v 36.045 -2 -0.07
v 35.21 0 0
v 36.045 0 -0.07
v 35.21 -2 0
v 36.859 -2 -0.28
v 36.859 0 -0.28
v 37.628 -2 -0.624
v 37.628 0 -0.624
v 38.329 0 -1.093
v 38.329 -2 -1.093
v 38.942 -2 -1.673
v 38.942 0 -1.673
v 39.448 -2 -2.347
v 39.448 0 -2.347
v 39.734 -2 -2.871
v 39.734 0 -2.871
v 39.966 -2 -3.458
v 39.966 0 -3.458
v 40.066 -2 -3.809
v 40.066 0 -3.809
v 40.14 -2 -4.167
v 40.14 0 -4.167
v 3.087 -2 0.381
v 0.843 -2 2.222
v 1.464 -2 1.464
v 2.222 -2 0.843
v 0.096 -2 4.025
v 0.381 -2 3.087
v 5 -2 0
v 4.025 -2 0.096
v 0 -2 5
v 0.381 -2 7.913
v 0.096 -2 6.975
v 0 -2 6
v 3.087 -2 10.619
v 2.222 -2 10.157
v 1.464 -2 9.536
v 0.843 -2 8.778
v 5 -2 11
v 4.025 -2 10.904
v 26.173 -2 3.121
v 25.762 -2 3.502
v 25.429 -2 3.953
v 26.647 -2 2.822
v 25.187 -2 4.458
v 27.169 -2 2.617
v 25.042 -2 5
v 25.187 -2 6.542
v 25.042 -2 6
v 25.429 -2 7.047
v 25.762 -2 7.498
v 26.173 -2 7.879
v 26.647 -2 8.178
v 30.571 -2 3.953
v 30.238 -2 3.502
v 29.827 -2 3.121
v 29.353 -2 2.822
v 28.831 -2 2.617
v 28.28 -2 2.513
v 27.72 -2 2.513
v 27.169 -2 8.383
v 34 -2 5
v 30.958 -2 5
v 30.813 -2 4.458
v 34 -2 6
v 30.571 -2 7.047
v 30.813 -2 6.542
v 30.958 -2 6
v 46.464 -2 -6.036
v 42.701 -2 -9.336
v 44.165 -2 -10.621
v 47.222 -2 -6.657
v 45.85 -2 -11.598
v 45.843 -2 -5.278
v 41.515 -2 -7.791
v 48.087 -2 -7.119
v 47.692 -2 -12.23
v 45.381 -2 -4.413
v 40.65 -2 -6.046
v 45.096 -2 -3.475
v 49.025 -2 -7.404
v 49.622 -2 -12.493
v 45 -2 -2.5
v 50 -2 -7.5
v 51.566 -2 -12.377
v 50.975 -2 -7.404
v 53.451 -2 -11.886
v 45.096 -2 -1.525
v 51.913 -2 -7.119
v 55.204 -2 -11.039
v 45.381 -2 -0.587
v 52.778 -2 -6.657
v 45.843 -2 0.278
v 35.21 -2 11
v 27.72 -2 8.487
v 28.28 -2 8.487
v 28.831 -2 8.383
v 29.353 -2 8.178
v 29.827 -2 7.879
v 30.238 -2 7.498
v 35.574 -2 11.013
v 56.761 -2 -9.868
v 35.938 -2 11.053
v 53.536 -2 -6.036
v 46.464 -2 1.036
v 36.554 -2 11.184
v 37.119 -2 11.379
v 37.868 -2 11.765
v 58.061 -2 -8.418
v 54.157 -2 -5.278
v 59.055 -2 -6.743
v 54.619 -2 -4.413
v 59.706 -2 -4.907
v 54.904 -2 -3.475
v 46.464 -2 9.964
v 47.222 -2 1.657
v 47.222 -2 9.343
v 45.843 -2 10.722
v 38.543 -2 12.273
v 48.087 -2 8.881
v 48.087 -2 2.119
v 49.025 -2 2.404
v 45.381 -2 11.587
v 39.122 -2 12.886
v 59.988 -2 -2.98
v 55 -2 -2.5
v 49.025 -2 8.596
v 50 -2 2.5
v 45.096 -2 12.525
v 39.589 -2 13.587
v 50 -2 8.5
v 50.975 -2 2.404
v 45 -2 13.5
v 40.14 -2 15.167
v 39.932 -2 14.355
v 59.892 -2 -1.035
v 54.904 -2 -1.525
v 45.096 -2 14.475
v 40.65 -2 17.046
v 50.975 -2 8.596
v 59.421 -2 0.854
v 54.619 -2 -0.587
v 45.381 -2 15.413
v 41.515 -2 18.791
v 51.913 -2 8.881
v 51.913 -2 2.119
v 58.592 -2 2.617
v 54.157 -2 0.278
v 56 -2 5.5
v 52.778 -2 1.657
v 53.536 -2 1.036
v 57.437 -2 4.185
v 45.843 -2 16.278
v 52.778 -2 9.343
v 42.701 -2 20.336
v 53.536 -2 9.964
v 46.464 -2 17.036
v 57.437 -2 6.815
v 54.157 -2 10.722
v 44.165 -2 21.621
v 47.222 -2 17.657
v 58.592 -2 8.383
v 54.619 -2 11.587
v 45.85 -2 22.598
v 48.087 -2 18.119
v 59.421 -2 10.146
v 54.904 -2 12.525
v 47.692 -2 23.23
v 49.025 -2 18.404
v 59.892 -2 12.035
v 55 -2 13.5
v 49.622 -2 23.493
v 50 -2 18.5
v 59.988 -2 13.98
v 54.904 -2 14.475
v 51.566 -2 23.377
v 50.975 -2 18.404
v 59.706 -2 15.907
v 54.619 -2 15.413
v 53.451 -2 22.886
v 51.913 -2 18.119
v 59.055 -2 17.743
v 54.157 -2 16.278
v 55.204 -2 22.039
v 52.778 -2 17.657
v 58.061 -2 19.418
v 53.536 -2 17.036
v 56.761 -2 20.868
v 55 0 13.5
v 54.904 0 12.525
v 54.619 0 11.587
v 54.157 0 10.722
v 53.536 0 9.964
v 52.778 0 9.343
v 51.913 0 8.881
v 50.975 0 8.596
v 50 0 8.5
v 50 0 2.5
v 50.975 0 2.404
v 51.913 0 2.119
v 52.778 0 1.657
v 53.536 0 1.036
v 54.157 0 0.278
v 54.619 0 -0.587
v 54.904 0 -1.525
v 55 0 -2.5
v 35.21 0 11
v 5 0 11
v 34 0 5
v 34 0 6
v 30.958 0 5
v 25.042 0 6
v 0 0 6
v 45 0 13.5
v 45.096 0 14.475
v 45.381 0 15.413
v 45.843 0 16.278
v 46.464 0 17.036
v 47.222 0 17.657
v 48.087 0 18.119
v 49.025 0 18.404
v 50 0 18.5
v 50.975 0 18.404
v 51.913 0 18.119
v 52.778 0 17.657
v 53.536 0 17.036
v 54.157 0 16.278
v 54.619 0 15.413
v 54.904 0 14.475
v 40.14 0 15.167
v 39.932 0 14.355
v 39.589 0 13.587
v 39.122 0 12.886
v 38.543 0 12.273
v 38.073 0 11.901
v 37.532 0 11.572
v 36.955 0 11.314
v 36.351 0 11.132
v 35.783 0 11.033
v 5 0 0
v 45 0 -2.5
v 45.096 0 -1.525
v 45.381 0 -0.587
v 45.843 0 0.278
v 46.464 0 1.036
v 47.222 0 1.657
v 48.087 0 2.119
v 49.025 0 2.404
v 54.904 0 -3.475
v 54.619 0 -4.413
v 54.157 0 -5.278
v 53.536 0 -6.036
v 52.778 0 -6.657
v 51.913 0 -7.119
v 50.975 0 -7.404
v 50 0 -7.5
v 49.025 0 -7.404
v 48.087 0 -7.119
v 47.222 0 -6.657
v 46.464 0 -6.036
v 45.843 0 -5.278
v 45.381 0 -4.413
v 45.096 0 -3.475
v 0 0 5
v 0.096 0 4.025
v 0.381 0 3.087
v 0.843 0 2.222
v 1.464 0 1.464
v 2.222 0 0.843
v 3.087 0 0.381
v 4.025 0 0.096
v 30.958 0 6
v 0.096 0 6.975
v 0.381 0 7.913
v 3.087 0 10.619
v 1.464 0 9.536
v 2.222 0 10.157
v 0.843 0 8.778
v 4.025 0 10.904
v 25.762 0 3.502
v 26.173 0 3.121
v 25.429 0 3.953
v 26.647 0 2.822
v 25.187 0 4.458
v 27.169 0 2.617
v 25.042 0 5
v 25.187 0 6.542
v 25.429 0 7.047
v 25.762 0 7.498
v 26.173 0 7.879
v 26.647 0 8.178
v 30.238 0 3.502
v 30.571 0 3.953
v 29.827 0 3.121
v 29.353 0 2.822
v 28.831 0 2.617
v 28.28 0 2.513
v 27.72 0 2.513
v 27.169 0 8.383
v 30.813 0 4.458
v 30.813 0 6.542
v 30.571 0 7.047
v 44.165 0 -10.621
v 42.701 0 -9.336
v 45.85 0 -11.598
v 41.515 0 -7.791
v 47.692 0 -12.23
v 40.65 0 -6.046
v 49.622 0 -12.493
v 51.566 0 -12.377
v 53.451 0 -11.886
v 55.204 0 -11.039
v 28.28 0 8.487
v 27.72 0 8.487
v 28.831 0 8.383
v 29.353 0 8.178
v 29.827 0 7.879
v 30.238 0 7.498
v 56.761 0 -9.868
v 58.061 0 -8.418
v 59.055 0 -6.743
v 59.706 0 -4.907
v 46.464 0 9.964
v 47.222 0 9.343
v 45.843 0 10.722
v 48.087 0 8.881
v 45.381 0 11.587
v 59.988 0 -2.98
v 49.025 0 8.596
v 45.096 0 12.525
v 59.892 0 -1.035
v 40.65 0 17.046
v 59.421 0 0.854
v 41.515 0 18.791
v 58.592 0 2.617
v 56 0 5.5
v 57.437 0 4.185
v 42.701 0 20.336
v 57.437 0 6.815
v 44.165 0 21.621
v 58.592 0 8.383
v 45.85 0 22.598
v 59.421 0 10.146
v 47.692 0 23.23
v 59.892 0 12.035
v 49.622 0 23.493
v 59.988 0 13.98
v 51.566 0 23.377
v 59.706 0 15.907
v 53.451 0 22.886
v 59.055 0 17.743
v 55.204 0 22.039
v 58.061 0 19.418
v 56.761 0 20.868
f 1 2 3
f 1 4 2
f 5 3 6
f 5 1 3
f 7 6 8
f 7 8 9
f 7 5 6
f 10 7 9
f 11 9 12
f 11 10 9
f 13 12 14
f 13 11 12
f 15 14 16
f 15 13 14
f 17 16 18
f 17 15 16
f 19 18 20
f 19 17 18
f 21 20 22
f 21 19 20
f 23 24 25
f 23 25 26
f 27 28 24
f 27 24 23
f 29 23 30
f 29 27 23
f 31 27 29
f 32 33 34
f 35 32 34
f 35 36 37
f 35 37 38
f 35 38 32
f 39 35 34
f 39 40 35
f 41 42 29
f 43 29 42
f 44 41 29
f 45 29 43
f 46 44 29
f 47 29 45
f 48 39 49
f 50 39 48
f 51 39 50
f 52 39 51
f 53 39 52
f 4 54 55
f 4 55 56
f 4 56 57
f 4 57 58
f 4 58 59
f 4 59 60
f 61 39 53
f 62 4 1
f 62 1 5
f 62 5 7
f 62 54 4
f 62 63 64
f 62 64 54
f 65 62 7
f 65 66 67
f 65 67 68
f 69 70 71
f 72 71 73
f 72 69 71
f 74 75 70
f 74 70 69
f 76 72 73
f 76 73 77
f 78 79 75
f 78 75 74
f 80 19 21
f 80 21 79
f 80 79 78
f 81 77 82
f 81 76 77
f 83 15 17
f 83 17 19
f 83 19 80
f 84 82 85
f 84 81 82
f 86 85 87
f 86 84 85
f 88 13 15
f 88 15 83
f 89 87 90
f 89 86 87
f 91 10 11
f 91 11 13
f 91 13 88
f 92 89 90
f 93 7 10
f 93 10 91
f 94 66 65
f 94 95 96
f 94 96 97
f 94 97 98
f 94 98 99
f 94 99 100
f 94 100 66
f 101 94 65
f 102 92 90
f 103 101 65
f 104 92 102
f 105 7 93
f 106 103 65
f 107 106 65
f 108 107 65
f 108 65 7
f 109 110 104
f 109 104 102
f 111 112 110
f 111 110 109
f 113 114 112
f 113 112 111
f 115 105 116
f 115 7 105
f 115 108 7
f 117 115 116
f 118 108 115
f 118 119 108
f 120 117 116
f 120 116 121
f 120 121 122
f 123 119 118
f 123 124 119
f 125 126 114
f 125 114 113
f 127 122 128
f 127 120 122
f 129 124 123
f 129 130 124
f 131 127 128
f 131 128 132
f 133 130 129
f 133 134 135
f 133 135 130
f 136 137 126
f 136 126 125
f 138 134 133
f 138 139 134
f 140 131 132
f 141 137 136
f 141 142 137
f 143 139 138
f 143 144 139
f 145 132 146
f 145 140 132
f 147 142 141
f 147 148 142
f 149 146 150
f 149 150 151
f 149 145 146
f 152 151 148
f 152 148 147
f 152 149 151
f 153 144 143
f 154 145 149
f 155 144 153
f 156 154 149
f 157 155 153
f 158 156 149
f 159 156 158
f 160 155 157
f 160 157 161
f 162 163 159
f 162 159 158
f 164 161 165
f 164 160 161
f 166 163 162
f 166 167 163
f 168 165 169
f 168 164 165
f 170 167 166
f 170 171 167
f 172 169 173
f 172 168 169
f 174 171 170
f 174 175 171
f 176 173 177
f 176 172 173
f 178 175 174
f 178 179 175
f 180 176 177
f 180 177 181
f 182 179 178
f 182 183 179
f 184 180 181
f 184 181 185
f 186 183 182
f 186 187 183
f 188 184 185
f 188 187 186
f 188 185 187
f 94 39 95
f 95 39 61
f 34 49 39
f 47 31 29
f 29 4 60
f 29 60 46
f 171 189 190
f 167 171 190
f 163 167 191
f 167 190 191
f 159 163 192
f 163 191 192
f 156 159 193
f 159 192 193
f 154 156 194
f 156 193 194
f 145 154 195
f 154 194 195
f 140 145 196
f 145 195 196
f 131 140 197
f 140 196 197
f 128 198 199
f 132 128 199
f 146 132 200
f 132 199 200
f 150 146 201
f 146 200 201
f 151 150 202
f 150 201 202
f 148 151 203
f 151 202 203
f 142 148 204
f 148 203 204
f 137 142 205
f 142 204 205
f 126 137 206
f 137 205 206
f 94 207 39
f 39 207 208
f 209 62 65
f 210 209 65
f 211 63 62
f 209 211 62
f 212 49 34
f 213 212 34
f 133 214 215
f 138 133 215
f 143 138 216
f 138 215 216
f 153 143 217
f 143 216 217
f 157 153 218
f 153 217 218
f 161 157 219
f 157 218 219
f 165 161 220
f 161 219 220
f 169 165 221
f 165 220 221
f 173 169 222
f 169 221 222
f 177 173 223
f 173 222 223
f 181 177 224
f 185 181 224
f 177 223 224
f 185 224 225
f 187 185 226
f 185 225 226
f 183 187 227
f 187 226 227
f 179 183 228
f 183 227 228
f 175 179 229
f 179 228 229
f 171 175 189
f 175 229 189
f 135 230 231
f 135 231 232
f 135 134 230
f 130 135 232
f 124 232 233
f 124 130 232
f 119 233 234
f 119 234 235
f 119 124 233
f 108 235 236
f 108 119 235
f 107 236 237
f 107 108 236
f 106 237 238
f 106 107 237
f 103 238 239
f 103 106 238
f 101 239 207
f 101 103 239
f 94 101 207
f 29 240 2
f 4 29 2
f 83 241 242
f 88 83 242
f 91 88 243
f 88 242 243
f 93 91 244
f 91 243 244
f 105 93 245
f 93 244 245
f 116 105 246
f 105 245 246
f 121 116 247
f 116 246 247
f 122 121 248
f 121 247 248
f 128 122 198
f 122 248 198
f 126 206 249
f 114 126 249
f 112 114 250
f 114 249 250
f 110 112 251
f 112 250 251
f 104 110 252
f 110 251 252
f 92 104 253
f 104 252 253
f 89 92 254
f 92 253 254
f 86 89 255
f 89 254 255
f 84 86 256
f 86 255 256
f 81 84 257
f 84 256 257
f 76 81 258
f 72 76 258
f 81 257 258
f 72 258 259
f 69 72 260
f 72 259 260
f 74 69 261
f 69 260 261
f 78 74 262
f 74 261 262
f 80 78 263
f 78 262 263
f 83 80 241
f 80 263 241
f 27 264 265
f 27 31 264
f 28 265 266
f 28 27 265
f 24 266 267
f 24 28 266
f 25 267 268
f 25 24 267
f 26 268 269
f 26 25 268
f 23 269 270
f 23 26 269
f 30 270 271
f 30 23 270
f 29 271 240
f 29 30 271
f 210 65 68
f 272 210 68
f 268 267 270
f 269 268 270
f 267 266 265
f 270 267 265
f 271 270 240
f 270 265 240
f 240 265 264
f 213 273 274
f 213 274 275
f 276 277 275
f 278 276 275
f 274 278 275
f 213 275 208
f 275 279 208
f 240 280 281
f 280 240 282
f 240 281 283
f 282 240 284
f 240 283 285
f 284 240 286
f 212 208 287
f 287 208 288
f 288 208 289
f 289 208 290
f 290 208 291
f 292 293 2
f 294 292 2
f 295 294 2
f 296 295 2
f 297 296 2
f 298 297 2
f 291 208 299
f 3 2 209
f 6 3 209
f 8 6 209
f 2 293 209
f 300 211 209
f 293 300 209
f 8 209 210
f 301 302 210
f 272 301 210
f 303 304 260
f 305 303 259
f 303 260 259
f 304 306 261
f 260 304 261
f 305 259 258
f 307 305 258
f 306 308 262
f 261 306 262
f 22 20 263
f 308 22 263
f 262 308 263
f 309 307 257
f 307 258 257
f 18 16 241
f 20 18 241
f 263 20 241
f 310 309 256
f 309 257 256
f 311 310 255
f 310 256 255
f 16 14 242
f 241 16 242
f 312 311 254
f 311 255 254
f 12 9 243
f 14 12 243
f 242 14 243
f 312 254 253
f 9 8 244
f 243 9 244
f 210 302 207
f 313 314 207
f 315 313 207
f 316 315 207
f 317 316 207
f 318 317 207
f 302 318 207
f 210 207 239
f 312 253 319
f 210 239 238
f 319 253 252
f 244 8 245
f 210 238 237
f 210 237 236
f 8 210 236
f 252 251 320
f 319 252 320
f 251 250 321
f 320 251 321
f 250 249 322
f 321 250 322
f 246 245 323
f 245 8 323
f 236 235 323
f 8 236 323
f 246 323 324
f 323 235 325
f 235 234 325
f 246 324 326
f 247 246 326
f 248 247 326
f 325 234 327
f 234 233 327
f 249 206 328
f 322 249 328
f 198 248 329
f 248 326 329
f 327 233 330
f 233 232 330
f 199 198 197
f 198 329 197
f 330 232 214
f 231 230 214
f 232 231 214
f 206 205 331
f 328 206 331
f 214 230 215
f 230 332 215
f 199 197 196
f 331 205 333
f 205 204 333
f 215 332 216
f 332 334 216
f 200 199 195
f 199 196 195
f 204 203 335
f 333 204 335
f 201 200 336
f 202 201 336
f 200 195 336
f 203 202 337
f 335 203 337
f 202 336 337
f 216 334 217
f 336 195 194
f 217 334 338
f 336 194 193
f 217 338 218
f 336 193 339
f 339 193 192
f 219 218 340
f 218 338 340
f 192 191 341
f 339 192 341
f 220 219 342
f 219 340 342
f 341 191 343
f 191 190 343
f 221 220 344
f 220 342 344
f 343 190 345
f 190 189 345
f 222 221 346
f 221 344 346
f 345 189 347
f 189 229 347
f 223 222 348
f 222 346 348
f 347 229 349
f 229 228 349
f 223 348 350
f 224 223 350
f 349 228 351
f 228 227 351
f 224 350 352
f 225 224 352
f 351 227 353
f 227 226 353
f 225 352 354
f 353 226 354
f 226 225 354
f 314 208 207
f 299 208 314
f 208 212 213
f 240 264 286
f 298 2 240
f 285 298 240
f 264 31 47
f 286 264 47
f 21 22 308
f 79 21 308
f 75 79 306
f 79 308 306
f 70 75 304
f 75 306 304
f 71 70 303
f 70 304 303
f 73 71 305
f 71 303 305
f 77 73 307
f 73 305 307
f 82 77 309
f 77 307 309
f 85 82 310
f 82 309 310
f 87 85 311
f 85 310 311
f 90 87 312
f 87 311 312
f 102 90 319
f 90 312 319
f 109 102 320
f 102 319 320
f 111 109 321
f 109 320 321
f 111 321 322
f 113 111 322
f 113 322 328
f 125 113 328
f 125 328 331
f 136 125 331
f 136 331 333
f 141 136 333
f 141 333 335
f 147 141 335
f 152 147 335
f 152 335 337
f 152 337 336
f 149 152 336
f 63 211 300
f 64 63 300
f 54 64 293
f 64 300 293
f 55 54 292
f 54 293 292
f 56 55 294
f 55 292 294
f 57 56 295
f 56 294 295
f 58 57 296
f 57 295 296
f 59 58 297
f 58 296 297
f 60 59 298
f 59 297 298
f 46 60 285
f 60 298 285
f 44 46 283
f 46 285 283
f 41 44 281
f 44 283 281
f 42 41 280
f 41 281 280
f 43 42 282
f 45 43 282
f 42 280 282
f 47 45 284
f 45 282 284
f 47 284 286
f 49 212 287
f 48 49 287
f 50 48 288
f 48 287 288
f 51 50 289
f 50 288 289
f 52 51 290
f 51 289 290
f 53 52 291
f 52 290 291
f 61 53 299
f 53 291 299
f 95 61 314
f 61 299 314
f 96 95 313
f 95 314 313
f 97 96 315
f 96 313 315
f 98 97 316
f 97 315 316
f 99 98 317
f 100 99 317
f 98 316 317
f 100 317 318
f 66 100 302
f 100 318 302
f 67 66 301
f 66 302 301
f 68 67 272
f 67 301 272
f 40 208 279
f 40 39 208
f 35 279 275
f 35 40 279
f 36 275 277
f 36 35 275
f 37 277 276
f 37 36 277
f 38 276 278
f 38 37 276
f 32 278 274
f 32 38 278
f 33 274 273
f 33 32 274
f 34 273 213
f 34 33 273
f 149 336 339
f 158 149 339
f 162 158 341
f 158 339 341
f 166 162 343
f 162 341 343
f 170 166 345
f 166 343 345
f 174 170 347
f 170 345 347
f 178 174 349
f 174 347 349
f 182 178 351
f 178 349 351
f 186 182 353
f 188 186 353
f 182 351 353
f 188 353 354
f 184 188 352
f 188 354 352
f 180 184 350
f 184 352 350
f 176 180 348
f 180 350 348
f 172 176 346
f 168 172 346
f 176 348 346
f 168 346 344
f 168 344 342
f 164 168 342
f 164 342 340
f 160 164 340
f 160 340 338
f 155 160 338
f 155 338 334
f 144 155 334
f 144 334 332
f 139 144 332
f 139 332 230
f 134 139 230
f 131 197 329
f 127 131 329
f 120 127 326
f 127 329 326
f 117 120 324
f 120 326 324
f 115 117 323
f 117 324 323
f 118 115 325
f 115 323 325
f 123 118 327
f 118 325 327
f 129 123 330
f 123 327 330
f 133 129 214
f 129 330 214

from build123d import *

# Parameters (mm, degrees)
F1_DEPTH = 2
F2_R     = 5
F4_DEPTH = 2


# Not quite as in the source:
# - a feature names something its author has since deleted; it is built from what else it names


with BuildPart() as f1:
    # F0 (on Front) → F1 (new body)
    with BuildSketch(Plane.XZ):
        with BuildLine():
            Line((0, 5.5), (0, 0))
            Line((0, 0), (40, 0))
            Line((40, 0), (40, 5.5))
            Line((40, 5.5), (31, 5.5))
            ThreePointArc((31, 5.5), (28, 2.5), (25, 5.5))
            Line((25, 5.5), (0, 5.5))
        make_face()
        with BuildLine():
            Line((40, 5.5), (40, 0))
            Line((40, 0), (40, -2.5))
            ThreePointArc((40, -2.5), (41.05572809, 1.972135955), (44, 5.5))
            Line((44, 5.5), (40, 5.5))
        make_face()
        with BuildLine():
            Line((0, 11), (0, 5.5))
            Line((0, 5.5), (25, 5.5))
            ThreePointArc((25, 5.5), (28, 8.5), (31, 5.5))
            Line((31, 5.5), (40, 5.5))
            Line((40, 5.5), (40, 11))
            Line((40, 11), (0, 11))
        make_face()
        with BuildLine():
            Line((40, 11), (40, 5.5))
            Line((40, 5.5), (44, 5.5))
            ThreePointArc((44, 5.5), (41.05572809, 9.027864045), (40, 13.5))
            Line((40, 13.5), (40, 11))
        make_face()
        with BuildLine():
            Line((45, -2.5), (40, -2.5))
            ThreePointArc((40, -2.5), (50, -12.5), (60, -2.5))
            ThreePointArc((60, -2.5), (58.94427191, 1.972135955), (56, 5.5))
            ThreePointArc((56, 5.5), (53.1622776602, 4.0131670195), (50, 3.5))
            Line((50, 3.5), (50, 2.5))
            ThreePointArc((50, 2.5), (53.5355339059, 1.0355339059), (55, -2.5))
            ThreePointArc((55, -2.5), (50, -7.5), (45, -2.5))
        make_face()
        with BuildLine():
            ThreePointArc((44, 5.5), (41.05572809, 1.972135955), (40, -2.5))
            Line((40, -2.5), (45, -2.5))
            ThreePointArc((45, -2.5), (46.4644660941, 1.0355339059), (50, 2.5))
            Line((50, 2.5), (50, 3.5))
            ThreePointArc((50, 3.5), (46.8377223398, 4.0131670195), (44, 5.5))
        make_face()
        with BuildLine():
            ThreePointArc((40, 13.5), (41.05572809, 9.027864045), (44, 5.5))
            ThreePointArc((44, 5.5), (46.8377223398, 6.9868329805), (50, 7.5))
            Line((50, 7.5), (50, 8.5))
            ThreePointArc((50, 8.5), (46.4644660941, 9.9644660941), (45, 13.5))
            Line((45, 13.5), (40, 13.5))
        make_face()
        with BuildLine():
            Line((50, 5.5), (44, 5.5))
            ThreePointArc((44, 5.5), (46.8377223398, 4.0131670195), (50, 3.5))
            Line((50, 3.5), (50, 5.5))
        make_face()
        with BuildLine():
            ThreePointArc((50, 7.5), (46.8377223398, 6.9868329805), (44, 5.5))
            Line((44, 5.5), (50, 5.5))
            Line((50, 5.5), (50, 7.5))
        make_face()
        with BuildLine():
            ThreePointArc((60, 13.5), (50, 23.5), (40, 13.5))
            Line((40, 13.5), (45, 13.5))
            ThreePointArc((45, 13.5), (50, 18.5), (55, 13.5))
            ThreePointArc((55, 13.5), (53.5355339059, 9.9644660941), (50, 8.5))
            Line((50, 8.5), (50, 7.5))
            ThreePointArc((50, 7.5), (53.1622776602, 6.9868329805), (56, 5.5))
            ThreePointArc((56, 5.5), (58.94427191, 9.027864045), (60, 13.5))
        make_face()
        with BuildLine():
            ThreePointArc((56, 5.5), (53.1622776602, 6.9868329805), (50, 7.5))
            Line((50, 7.5), (50, 5.5))
            Line((50, 5.5), (56, 5.5))
        make_face()
        with BuildLine():
            Line((50, 5.5), (50, 3.5))
            ThreePointArc((50, 3.5), (53.1622776602, 4.0131670195), (56, 5.5))
            Line((56, 5.5), (50, 5.5))
        make_face()
    extrude(amount=F1_DEPTH)

    # F2
    f2_edges = [f1.edges().sort_by_distance(p)[0] for p in [
        (40, -1, 11),
        (40, -1, 0),
        (0, -1, 11),
        (0, -1, 0),
    ]]
    fillet(f2_edges, radius=F2_R)

    # F3 (on face) → F4 (cut, through all)
    with BuildSketch(Plane.XZ.offset(2)):
        with BuildLine():
            Line((25.0419601085, 6), (0, 6))
            Line((0, 6), (0, 5))
            Line((0, 5), (25.0419601085, 5))
            ThreePointArc((25.0419601085, 5), (25, 5.5), (25.0419601085, 6))
        make_face()
        with BuildLine():
            Line((34, 6), (30.9580398915, 6))
            ThreePointArc((30.9580398915, 6), (30.9894915684, 5.7508787808), (31, 5.5))
            ThreePointArc((31, 5.5), (30.9894915684, 5.2491212192), (30.9580398915, 5))
            Line((30.9580398915, 5), (34, 5))
            Line((34, 5), (34, 6))
        make_face()
    extrude(amount=-F4_DEPTH, mode=Mode.SUBTRACT)


solid = f1.part
